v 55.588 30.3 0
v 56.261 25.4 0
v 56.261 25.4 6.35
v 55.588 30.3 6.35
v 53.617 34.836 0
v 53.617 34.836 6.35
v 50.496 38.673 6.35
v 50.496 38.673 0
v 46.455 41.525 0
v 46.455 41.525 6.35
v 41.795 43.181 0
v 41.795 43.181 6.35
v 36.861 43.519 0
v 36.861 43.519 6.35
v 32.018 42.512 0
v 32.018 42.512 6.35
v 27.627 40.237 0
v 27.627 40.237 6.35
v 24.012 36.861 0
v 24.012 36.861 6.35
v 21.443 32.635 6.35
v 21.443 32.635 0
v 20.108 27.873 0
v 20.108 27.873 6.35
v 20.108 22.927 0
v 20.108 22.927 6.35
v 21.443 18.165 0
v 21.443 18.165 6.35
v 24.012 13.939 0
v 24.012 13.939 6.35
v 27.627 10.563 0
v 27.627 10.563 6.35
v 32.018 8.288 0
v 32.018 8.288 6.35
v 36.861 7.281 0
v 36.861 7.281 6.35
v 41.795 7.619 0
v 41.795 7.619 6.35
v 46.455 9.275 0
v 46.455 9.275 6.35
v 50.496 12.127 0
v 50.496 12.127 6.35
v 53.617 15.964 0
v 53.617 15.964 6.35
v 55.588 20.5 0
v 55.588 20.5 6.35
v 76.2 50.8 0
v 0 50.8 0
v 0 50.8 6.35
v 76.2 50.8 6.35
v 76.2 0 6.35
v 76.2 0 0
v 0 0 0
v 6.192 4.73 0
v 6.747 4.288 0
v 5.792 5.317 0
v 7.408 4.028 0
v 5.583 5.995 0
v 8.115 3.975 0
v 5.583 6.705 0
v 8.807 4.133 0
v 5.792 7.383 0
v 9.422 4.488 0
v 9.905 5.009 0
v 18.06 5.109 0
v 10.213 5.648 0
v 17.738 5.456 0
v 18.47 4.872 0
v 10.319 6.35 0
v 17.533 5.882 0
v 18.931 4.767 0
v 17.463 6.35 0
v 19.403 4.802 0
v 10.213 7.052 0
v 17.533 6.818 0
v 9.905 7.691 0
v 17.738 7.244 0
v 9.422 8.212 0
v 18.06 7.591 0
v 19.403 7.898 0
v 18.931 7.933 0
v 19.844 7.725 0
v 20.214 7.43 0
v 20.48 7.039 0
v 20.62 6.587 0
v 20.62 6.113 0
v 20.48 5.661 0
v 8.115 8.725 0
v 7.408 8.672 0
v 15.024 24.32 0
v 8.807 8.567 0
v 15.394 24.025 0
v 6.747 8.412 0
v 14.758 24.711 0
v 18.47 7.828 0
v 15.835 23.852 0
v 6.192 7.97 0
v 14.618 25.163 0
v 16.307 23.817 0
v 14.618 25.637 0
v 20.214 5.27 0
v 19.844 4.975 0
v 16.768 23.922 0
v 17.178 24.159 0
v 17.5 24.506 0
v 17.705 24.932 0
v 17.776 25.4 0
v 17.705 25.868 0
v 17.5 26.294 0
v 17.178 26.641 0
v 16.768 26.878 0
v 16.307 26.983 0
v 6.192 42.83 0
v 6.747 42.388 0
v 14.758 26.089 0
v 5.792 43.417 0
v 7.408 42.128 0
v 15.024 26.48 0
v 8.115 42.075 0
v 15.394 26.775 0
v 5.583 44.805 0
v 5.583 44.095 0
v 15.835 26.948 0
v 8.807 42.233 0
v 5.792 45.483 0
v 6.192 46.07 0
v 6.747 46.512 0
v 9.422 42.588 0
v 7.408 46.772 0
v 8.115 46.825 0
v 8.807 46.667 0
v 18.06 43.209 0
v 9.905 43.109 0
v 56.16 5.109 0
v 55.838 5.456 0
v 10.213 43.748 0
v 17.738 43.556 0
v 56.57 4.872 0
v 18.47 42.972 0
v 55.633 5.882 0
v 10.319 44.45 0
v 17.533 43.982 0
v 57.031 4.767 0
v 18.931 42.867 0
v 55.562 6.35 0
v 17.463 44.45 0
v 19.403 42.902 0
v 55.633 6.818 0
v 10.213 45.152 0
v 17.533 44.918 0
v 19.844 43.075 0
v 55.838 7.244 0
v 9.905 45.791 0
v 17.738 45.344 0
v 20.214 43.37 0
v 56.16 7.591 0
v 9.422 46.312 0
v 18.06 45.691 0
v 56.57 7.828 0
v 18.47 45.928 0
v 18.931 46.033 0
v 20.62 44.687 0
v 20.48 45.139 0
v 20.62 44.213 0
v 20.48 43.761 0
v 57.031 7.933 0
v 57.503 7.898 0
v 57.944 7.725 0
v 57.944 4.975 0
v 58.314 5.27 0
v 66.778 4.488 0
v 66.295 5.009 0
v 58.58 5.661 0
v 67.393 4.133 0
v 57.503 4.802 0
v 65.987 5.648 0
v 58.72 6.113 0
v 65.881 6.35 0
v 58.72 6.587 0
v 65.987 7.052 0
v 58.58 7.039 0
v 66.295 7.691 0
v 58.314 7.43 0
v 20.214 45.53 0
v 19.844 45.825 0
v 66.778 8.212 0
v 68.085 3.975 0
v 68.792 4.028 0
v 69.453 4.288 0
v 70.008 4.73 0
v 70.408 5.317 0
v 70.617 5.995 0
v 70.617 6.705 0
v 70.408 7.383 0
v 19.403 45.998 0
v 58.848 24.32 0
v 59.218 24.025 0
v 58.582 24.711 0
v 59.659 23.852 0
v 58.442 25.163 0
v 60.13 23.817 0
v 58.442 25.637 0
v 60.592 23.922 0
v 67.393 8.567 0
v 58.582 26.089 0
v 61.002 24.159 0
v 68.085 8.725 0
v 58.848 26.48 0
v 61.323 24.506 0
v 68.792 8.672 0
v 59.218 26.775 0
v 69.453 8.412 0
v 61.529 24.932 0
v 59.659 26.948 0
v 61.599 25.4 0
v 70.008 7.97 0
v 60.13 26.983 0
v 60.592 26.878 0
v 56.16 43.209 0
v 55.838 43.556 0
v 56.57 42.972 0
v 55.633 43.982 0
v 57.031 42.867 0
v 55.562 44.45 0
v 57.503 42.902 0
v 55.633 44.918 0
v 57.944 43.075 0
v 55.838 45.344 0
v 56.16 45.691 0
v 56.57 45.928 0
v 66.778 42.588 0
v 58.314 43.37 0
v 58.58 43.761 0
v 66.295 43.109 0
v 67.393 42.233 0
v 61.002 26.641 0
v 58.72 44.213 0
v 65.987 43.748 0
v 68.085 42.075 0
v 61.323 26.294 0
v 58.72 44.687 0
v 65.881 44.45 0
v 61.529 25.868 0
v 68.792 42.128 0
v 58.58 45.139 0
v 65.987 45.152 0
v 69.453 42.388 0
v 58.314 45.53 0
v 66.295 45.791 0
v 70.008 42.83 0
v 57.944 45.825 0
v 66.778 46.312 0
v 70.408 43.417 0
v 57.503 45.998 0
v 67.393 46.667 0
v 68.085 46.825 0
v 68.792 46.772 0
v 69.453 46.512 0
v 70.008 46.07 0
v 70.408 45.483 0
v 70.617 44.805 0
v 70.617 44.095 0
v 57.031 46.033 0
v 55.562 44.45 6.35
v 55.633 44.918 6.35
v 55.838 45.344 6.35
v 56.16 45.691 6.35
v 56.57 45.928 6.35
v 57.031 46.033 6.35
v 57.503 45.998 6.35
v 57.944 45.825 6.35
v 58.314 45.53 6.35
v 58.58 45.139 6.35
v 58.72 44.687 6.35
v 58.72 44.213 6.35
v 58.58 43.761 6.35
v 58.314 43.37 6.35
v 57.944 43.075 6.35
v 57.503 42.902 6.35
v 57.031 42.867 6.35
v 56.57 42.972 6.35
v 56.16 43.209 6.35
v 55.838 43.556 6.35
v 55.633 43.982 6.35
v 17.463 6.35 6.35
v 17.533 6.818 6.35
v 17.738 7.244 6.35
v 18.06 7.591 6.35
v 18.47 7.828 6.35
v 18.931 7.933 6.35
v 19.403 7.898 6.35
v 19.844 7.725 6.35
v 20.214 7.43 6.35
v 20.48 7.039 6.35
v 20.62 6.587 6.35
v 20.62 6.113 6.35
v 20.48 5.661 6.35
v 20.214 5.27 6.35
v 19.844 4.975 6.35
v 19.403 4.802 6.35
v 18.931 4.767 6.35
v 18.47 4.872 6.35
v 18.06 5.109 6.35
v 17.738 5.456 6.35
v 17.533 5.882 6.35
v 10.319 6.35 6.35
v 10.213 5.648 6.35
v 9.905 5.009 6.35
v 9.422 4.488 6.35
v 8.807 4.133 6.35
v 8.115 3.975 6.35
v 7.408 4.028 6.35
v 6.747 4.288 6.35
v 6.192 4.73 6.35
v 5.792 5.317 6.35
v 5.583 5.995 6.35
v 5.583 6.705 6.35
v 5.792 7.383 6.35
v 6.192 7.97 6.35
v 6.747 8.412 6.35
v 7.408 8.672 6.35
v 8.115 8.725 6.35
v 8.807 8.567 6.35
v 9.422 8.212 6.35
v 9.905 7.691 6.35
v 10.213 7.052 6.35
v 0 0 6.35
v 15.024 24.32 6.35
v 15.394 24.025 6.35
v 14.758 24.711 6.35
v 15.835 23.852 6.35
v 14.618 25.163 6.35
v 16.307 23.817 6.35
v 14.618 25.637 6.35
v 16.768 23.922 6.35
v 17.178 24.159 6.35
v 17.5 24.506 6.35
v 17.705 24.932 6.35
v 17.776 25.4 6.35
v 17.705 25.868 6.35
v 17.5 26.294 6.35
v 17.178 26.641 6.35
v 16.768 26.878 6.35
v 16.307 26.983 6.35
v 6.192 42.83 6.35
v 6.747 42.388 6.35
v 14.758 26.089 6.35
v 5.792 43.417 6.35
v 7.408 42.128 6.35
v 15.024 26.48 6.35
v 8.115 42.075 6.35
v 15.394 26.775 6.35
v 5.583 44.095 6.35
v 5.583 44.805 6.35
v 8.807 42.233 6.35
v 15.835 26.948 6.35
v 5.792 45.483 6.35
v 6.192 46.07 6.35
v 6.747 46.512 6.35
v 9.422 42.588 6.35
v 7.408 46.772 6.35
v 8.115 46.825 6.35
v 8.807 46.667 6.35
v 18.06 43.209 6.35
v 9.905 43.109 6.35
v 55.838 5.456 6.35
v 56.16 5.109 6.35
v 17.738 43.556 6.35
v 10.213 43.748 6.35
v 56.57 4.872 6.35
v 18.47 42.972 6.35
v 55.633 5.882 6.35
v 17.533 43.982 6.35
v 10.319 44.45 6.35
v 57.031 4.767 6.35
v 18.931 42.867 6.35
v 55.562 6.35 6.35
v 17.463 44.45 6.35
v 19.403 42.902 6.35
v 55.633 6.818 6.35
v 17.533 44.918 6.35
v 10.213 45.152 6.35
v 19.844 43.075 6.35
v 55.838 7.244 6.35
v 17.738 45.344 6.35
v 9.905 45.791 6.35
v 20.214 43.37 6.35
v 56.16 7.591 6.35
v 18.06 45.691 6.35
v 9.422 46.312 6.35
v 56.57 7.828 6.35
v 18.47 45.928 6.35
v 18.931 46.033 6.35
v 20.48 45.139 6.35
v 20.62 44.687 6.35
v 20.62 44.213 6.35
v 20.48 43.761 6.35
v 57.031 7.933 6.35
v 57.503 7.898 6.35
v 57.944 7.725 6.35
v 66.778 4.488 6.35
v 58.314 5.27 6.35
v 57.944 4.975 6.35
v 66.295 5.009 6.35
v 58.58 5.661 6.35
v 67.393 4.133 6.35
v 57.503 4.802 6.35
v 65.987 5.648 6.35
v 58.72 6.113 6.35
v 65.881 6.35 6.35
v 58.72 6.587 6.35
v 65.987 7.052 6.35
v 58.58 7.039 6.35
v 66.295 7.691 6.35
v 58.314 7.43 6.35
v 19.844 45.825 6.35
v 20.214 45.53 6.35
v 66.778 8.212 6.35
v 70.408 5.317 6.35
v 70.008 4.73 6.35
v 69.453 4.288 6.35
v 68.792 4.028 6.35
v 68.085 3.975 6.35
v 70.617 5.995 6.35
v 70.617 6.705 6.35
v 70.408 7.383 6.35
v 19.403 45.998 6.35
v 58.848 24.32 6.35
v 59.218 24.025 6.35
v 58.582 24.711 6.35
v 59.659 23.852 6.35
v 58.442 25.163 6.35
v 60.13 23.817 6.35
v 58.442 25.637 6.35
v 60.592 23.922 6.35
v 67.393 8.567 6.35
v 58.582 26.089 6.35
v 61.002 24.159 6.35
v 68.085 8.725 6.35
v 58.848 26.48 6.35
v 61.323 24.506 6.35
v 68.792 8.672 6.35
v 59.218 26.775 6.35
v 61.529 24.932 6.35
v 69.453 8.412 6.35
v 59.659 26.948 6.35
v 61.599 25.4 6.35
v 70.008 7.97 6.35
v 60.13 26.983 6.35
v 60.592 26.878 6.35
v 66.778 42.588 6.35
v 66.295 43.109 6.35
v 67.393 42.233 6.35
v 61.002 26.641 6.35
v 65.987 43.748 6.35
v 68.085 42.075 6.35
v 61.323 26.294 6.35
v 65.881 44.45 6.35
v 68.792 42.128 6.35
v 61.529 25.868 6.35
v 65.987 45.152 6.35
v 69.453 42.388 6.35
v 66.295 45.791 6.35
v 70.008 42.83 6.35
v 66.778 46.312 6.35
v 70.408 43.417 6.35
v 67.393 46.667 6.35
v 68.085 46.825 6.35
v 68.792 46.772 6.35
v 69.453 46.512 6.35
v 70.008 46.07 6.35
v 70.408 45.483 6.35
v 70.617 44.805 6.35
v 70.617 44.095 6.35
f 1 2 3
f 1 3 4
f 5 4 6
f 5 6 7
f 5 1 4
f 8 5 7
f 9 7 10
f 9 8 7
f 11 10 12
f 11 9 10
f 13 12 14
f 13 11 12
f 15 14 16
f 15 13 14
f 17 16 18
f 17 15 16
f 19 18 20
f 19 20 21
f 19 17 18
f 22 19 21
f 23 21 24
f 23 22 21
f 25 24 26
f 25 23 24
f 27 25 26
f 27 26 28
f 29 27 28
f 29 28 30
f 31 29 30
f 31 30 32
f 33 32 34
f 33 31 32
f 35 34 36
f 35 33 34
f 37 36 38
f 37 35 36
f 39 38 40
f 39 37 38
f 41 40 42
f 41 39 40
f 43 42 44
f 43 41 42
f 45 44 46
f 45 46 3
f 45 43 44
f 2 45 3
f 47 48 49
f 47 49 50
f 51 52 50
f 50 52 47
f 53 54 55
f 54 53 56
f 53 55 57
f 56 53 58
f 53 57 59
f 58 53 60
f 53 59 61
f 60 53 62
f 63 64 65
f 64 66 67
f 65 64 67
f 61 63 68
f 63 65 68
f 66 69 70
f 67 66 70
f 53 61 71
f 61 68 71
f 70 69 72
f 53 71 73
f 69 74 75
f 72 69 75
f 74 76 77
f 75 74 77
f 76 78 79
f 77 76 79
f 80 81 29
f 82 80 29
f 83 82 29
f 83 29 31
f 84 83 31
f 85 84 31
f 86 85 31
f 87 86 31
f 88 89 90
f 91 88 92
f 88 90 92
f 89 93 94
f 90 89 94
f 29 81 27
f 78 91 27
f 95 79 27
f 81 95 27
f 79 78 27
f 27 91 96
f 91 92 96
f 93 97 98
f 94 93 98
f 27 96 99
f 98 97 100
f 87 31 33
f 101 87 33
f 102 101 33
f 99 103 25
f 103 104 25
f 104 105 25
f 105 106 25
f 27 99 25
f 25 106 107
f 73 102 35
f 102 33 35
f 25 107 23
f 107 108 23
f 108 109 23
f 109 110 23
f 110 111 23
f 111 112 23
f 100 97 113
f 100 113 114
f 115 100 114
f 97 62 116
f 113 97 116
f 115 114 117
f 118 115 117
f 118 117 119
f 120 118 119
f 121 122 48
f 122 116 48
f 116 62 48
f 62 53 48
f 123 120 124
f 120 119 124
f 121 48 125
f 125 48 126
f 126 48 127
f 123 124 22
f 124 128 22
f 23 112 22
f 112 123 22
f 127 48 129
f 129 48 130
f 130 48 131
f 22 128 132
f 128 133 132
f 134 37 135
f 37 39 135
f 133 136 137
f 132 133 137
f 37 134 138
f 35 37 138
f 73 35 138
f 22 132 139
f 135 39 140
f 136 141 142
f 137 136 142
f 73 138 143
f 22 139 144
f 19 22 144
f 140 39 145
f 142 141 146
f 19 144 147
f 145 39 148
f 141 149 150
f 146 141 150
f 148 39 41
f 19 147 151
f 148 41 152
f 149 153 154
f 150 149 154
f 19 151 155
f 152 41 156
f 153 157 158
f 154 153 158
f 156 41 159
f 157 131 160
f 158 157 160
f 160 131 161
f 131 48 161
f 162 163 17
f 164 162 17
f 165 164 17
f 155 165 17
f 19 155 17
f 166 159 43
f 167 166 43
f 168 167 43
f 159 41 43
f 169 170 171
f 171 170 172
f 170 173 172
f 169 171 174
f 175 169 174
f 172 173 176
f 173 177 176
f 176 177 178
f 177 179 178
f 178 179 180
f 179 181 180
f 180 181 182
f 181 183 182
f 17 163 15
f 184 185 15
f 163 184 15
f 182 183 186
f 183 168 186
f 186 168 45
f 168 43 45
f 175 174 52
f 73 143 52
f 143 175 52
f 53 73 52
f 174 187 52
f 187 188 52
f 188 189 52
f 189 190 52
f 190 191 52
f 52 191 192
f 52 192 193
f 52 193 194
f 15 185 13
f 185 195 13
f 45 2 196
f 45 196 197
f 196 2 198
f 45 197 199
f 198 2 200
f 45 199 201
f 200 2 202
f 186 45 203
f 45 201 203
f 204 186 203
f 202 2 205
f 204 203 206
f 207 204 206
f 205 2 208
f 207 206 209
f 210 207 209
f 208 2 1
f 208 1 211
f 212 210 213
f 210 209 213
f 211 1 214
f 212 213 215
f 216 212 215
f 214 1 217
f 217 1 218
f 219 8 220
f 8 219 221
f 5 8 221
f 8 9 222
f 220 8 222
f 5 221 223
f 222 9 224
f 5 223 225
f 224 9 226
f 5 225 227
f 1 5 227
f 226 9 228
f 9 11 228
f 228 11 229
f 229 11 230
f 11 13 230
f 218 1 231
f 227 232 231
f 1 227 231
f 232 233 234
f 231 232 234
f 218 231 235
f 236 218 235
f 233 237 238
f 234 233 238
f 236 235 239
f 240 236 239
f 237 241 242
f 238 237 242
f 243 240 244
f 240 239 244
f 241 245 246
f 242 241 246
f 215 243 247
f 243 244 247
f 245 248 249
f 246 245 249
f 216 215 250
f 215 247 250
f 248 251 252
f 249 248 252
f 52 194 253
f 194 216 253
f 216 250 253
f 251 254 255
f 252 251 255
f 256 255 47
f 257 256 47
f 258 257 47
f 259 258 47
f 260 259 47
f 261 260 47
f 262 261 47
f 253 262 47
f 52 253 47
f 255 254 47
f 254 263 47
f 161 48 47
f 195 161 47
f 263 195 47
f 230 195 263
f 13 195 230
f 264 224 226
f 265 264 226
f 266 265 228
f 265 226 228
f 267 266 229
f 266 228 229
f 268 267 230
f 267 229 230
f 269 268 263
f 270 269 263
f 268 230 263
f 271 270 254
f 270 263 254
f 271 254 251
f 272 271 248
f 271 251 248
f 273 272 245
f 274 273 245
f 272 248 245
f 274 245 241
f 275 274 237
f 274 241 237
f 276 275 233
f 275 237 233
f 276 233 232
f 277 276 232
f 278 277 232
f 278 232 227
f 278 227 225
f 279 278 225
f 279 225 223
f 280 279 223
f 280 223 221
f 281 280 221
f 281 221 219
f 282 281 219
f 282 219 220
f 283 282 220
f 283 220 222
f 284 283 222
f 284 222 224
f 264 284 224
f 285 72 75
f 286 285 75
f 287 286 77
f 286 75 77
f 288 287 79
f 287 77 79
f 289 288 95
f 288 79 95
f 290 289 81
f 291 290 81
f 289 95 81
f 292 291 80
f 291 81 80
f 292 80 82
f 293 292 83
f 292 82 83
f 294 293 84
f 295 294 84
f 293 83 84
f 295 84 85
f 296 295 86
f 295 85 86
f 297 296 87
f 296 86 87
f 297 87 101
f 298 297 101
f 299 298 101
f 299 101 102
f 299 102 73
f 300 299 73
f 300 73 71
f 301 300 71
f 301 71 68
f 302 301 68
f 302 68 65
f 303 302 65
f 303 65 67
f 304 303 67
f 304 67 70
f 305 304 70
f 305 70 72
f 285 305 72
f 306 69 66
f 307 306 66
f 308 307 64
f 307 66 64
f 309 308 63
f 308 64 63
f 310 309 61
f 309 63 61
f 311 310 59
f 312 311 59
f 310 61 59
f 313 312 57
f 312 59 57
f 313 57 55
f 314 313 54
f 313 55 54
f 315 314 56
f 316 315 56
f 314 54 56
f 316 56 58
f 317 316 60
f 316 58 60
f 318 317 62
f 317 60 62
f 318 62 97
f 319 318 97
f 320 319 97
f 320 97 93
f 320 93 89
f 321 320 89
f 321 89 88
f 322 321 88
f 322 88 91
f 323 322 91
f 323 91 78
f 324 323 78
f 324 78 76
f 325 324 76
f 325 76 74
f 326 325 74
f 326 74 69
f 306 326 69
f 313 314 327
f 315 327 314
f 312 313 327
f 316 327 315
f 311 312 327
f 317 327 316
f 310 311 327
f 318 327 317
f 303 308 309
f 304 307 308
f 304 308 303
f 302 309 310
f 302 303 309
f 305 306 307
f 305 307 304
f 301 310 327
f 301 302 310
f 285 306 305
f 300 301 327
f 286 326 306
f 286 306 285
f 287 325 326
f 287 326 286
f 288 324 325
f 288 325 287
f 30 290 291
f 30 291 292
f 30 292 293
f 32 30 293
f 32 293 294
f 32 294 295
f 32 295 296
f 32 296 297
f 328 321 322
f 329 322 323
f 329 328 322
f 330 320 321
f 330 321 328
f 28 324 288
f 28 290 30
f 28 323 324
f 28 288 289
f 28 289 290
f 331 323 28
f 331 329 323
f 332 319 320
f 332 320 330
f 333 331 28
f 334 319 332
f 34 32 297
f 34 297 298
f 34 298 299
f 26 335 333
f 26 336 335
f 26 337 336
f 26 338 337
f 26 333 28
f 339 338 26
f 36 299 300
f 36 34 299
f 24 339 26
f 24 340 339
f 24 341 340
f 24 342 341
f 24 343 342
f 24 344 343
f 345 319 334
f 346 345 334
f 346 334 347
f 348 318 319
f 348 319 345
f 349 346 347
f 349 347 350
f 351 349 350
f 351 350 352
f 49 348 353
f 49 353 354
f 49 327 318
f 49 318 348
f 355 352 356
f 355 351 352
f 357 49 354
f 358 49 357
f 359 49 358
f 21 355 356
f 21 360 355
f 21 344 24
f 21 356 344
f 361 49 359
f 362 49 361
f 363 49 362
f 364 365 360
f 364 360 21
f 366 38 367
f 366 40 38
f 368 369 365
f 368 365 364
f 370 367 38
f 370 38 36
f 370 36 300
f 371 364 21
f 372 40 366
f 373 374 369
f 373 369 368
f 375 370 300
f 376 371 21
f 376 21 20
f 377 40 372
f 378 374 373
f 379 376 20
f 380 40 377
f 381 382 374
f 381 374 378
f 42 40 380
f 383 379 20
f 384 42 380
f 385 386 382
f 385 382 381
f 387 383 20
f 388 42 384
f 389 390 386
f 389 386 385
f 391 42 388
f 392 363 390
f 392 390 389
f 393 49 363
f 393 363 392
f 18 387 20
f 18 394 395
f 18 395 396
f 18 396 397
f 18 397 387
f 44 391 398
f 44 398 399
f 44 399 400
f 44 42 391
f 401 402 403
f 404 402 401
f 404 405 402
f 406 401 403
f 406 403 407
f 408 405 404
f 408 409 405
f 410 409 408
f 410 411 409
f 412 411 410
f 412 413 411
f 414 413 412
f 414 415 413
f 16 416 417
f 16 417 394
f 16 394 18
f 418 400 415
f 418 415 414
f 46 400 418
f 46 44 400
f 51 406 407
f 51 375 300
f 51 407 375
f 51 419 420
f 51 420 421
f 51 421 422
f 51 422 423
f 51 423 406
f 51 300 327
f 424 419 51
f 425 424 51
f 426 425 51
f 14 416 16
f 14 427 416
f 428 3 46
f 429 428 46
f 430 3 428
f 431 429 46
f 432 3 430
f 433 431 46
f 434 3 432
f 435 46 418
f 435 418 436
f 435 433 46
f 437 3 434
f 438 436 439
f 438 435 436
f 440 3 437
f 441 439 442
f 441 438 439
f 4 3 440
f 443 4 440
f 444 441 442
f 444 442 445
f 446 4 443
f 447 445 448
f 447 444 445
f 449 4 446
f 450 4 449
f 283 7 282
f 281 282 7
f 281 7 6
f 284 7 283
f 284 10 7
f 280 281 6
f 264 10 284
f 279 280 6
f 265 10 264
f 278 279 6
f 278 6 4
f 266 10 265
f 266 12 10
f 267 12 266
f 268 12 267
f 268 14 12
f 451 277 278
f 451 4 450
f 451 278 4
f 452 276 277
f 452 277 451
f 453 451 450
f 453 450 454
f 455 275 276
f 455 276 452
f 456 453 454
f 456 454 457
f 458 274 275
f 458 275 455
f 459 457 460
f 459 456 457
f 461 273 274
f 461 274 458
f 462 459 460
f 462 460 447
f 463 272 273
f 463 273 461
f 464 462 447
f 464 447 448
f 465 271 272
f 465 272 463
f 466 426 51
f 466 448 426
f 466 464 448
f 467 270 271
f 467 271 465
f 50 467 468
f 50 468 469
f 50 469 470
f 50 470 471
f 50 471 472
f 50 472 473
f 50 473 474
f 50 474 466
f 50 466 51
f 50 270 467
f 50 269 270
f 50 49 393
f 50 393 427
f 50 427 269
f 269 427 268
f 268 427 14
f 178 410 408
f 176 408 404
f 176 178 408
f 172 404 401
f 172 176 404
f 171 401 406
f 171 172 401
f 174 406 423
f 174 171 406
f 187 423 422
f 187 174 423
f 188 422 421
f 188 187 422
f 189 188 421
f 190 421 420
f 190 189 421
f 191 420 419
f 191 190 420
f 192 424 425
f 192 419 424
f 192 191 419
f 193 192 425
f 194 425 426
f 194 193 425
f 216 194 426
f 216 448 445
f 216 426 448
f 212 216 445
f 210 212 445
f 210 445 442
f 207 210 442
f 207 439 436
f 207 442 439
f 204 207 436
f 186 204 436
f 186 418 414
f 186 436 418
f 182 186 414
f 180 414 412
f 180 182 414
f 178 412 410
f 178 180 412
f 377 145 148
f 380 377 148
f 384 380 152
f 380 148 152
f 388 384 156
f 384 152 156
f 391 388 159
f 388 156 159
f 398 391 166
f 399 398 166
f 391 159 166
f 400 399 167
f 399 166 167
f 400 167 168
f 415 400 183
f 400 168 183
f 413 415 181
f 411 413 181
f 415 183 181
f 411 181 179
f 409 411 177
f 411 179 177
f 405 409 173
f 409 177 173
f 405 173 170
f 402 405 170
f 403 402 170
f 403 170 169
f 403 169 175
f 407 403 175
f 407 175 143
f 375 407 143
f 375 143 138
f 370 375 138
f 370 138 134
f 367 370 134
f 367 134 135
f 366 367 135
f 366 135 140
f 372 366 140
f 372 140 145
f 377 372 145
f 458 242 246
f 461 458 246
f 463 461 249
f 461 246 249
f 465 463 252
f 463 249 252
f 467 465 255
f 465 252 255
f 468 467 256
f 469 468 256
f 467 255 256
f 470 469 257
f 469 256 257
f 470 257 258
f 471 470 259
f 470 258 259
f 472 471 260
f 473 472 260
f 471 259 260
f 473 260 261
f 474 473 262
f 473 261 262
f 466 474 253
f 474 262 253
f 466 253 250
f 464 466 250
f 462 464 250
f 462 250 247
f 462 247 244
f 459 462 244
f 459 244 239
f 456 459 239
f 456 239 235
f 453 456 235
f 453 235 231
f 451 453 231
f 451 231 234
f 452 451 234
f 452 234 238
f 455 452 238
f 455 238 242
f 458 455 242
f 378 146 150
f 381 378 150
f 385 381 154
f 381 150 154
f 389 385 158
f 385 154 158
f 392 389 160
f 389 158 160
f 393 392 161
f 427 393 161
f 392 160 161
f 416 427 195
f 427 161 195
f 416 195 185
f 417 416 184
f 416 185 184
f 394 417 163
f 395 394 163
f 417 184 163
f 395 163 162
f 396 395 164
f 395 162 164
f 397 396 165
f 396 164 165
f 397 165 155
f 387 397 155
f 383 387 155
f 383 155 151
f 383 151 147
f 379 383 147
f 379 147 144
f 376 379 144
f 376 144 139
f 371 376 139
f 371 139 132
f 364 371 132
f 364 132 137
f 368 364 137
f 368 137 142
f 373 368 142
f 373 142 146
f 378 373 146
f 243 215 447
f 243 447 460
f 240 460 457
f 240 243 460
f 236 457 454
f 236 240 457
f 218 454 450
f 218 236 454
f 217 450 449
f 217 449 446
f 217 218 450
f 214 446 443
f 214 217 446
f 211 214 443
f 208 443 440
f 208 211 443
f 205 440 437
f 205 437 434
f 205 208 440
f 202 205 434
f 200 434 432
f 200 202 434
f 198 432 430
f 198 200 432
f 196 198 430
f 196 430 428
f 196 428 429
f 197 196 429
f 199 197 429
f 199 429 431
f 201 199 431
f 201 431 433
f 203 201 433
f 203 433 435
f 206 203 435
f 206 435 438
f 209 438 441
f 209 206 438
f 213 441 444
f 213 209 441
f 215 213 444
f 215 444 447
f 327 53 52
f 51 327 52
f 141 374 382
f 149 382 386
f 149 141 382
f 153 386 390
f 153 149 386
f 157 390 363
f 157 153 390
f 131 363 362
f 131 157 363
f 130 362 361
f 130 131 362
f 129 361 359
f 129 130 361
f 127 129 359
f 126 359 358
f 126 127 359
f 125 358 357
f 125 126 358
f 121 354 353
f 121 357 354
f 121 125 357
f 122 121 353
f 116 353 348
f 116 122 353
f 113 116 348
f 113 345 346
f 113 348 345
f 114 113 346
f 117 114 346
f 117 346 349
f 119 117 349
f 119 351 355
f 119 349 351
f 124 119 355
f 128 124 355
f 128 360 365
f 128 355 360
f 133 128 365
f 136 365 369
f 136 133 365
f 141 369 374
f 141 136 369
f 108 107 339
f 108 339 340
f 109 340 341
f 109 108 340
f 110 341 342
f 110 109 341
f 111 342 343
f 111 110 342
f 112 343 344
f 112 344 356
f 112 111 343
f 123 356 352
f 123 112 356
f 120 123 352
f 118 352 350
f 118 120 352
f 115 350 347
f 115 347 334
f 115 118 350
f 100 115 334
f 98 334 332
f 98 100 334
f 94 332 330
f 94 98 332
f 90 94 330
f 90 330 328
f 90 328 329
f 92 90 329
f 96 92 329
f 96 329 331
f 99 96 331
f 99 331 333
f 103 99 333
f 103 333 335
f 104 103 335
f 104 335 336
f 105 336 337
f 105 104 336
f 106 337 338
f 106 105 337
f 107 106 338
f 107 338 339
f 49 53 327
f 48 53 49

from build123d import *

# Parameters (mm, degrees)
SKETCH1_W               = 76.2
SKETCH1_H               = 50.8
BOSS_EXTRUDE1_DEPTH     = 6.35
CAVITY5_OUTLINE_R       = 18.161
CAVITY5_OUTLINE_R_2     = 1.5875
CAVITY5_DEPTH           = 6.35
SKETCH3_R               = 2.38125
CUT_EXTRUDE1_DEPTH      = 92.800885072
MIRROR2_COPY_1_SKETCH_R = 2.38125
MIRROR2_COPY_1_DEPTH    = 92.800885072
SKETCH4_R               = 1.5875
CUT_EXTRUDE2_DEPTH      = 92.800885072


# Read off the part's stored shape, not the designer's step: Cavity5
with BuildPart() as part:
    # Sketch1 → Boss-Extrude1 (new body)
    with BuildSketch(Plane.XY):
        with Locations((38.1, 25.4)):
            Rectangle(SKETCH1_W, SKETCH1_H)
    extrude(amount=BOSS_EXTRUDE1_DEPTH)

    # Cavity5 outline → Cavity5 (cut)
    with BuildSketch(Plane.XY):
        with Locations((38.1, 25.4)):
            Circle(CAVITY5_OUTLINE_R)
        with Locations((16.188175065, 25.4)):
            Circle(CAVITY5_OUTLINE_R_2)
        with Locations((60.011824935, 25.4)):
            Circle(CAVITY5_OUTLINE_R_2)
    extrude(amount=CAVITY5_DEPTH, mode=Mode.SUBTRACT)

    # Sketch3 → Cut-Extrude1 (cut, through all)
    with BuildSketch(Plane(origin=(0, 0, 0), x_dir=(-1, 0, 0), z_dir=(0, 0, -1))):
        with Locations((-68.2625, 44.45)):
            Circle(SKETCH3_R)
    cut_extrude1 = extrude(amount=-CUT_EXTRUDE1_DEPTH, mode=Mode.SUBTRACT)

    # Mirror1: Cut-Extrude1 across plane
    add(cut_extrude1.mirror(Plane(origin=(38.1, 0, 0), x_dir=(0, 0, 1), z_dir=(1, 0, 0))), mode=Mode.SUBTRACT)

    # Mirror2: Cut-Extrude1 across plane
    add(cut_extrude1.mirror(Plane.ZX.offset(25.4)), mode=Mode.SUBTRACT)

    # Mirror2 copy 1 sketch → Mirror2 copy 1 (cut, through all)
    with BuildSketch(Plane(origin=(76.2, 50.8, 0), x_dir=(1, 0, 0), z_dir=(0, 0, -1))):
        with Locations((-68.2625, 44.45)):
            Circle(MIRROR2_COPY_1_SKETCH_R)
    extrude(amount=-MIRROR2_COPY_1_DEPTH, mode=Mode.SUBTRACT)

    # Sketch4 → Cut-Extrude2 (cut, through all)
    with BuildSketch(Plane(origin=(0, 0, 0), x_dir=(-1, 0, 0), z_dir=(0, 0, -1))):
        with Locations((-19.05, 6.35)):
            Circle(SKETCH4_R)
        with Locations((-57.15, 6.35)):
            Circle(SKETCH4_R)
        with Locations((-19.05, 44.45)):
            Circle(SKETCH4_R)
        with Locations((-57.15, 44.45)):
            Circle(SKETCH4_R)
    extrude(amount=-CUT_EXTRUDE2_DEPTH, mode=Mode.SUBTRACT)


solid = part.part
